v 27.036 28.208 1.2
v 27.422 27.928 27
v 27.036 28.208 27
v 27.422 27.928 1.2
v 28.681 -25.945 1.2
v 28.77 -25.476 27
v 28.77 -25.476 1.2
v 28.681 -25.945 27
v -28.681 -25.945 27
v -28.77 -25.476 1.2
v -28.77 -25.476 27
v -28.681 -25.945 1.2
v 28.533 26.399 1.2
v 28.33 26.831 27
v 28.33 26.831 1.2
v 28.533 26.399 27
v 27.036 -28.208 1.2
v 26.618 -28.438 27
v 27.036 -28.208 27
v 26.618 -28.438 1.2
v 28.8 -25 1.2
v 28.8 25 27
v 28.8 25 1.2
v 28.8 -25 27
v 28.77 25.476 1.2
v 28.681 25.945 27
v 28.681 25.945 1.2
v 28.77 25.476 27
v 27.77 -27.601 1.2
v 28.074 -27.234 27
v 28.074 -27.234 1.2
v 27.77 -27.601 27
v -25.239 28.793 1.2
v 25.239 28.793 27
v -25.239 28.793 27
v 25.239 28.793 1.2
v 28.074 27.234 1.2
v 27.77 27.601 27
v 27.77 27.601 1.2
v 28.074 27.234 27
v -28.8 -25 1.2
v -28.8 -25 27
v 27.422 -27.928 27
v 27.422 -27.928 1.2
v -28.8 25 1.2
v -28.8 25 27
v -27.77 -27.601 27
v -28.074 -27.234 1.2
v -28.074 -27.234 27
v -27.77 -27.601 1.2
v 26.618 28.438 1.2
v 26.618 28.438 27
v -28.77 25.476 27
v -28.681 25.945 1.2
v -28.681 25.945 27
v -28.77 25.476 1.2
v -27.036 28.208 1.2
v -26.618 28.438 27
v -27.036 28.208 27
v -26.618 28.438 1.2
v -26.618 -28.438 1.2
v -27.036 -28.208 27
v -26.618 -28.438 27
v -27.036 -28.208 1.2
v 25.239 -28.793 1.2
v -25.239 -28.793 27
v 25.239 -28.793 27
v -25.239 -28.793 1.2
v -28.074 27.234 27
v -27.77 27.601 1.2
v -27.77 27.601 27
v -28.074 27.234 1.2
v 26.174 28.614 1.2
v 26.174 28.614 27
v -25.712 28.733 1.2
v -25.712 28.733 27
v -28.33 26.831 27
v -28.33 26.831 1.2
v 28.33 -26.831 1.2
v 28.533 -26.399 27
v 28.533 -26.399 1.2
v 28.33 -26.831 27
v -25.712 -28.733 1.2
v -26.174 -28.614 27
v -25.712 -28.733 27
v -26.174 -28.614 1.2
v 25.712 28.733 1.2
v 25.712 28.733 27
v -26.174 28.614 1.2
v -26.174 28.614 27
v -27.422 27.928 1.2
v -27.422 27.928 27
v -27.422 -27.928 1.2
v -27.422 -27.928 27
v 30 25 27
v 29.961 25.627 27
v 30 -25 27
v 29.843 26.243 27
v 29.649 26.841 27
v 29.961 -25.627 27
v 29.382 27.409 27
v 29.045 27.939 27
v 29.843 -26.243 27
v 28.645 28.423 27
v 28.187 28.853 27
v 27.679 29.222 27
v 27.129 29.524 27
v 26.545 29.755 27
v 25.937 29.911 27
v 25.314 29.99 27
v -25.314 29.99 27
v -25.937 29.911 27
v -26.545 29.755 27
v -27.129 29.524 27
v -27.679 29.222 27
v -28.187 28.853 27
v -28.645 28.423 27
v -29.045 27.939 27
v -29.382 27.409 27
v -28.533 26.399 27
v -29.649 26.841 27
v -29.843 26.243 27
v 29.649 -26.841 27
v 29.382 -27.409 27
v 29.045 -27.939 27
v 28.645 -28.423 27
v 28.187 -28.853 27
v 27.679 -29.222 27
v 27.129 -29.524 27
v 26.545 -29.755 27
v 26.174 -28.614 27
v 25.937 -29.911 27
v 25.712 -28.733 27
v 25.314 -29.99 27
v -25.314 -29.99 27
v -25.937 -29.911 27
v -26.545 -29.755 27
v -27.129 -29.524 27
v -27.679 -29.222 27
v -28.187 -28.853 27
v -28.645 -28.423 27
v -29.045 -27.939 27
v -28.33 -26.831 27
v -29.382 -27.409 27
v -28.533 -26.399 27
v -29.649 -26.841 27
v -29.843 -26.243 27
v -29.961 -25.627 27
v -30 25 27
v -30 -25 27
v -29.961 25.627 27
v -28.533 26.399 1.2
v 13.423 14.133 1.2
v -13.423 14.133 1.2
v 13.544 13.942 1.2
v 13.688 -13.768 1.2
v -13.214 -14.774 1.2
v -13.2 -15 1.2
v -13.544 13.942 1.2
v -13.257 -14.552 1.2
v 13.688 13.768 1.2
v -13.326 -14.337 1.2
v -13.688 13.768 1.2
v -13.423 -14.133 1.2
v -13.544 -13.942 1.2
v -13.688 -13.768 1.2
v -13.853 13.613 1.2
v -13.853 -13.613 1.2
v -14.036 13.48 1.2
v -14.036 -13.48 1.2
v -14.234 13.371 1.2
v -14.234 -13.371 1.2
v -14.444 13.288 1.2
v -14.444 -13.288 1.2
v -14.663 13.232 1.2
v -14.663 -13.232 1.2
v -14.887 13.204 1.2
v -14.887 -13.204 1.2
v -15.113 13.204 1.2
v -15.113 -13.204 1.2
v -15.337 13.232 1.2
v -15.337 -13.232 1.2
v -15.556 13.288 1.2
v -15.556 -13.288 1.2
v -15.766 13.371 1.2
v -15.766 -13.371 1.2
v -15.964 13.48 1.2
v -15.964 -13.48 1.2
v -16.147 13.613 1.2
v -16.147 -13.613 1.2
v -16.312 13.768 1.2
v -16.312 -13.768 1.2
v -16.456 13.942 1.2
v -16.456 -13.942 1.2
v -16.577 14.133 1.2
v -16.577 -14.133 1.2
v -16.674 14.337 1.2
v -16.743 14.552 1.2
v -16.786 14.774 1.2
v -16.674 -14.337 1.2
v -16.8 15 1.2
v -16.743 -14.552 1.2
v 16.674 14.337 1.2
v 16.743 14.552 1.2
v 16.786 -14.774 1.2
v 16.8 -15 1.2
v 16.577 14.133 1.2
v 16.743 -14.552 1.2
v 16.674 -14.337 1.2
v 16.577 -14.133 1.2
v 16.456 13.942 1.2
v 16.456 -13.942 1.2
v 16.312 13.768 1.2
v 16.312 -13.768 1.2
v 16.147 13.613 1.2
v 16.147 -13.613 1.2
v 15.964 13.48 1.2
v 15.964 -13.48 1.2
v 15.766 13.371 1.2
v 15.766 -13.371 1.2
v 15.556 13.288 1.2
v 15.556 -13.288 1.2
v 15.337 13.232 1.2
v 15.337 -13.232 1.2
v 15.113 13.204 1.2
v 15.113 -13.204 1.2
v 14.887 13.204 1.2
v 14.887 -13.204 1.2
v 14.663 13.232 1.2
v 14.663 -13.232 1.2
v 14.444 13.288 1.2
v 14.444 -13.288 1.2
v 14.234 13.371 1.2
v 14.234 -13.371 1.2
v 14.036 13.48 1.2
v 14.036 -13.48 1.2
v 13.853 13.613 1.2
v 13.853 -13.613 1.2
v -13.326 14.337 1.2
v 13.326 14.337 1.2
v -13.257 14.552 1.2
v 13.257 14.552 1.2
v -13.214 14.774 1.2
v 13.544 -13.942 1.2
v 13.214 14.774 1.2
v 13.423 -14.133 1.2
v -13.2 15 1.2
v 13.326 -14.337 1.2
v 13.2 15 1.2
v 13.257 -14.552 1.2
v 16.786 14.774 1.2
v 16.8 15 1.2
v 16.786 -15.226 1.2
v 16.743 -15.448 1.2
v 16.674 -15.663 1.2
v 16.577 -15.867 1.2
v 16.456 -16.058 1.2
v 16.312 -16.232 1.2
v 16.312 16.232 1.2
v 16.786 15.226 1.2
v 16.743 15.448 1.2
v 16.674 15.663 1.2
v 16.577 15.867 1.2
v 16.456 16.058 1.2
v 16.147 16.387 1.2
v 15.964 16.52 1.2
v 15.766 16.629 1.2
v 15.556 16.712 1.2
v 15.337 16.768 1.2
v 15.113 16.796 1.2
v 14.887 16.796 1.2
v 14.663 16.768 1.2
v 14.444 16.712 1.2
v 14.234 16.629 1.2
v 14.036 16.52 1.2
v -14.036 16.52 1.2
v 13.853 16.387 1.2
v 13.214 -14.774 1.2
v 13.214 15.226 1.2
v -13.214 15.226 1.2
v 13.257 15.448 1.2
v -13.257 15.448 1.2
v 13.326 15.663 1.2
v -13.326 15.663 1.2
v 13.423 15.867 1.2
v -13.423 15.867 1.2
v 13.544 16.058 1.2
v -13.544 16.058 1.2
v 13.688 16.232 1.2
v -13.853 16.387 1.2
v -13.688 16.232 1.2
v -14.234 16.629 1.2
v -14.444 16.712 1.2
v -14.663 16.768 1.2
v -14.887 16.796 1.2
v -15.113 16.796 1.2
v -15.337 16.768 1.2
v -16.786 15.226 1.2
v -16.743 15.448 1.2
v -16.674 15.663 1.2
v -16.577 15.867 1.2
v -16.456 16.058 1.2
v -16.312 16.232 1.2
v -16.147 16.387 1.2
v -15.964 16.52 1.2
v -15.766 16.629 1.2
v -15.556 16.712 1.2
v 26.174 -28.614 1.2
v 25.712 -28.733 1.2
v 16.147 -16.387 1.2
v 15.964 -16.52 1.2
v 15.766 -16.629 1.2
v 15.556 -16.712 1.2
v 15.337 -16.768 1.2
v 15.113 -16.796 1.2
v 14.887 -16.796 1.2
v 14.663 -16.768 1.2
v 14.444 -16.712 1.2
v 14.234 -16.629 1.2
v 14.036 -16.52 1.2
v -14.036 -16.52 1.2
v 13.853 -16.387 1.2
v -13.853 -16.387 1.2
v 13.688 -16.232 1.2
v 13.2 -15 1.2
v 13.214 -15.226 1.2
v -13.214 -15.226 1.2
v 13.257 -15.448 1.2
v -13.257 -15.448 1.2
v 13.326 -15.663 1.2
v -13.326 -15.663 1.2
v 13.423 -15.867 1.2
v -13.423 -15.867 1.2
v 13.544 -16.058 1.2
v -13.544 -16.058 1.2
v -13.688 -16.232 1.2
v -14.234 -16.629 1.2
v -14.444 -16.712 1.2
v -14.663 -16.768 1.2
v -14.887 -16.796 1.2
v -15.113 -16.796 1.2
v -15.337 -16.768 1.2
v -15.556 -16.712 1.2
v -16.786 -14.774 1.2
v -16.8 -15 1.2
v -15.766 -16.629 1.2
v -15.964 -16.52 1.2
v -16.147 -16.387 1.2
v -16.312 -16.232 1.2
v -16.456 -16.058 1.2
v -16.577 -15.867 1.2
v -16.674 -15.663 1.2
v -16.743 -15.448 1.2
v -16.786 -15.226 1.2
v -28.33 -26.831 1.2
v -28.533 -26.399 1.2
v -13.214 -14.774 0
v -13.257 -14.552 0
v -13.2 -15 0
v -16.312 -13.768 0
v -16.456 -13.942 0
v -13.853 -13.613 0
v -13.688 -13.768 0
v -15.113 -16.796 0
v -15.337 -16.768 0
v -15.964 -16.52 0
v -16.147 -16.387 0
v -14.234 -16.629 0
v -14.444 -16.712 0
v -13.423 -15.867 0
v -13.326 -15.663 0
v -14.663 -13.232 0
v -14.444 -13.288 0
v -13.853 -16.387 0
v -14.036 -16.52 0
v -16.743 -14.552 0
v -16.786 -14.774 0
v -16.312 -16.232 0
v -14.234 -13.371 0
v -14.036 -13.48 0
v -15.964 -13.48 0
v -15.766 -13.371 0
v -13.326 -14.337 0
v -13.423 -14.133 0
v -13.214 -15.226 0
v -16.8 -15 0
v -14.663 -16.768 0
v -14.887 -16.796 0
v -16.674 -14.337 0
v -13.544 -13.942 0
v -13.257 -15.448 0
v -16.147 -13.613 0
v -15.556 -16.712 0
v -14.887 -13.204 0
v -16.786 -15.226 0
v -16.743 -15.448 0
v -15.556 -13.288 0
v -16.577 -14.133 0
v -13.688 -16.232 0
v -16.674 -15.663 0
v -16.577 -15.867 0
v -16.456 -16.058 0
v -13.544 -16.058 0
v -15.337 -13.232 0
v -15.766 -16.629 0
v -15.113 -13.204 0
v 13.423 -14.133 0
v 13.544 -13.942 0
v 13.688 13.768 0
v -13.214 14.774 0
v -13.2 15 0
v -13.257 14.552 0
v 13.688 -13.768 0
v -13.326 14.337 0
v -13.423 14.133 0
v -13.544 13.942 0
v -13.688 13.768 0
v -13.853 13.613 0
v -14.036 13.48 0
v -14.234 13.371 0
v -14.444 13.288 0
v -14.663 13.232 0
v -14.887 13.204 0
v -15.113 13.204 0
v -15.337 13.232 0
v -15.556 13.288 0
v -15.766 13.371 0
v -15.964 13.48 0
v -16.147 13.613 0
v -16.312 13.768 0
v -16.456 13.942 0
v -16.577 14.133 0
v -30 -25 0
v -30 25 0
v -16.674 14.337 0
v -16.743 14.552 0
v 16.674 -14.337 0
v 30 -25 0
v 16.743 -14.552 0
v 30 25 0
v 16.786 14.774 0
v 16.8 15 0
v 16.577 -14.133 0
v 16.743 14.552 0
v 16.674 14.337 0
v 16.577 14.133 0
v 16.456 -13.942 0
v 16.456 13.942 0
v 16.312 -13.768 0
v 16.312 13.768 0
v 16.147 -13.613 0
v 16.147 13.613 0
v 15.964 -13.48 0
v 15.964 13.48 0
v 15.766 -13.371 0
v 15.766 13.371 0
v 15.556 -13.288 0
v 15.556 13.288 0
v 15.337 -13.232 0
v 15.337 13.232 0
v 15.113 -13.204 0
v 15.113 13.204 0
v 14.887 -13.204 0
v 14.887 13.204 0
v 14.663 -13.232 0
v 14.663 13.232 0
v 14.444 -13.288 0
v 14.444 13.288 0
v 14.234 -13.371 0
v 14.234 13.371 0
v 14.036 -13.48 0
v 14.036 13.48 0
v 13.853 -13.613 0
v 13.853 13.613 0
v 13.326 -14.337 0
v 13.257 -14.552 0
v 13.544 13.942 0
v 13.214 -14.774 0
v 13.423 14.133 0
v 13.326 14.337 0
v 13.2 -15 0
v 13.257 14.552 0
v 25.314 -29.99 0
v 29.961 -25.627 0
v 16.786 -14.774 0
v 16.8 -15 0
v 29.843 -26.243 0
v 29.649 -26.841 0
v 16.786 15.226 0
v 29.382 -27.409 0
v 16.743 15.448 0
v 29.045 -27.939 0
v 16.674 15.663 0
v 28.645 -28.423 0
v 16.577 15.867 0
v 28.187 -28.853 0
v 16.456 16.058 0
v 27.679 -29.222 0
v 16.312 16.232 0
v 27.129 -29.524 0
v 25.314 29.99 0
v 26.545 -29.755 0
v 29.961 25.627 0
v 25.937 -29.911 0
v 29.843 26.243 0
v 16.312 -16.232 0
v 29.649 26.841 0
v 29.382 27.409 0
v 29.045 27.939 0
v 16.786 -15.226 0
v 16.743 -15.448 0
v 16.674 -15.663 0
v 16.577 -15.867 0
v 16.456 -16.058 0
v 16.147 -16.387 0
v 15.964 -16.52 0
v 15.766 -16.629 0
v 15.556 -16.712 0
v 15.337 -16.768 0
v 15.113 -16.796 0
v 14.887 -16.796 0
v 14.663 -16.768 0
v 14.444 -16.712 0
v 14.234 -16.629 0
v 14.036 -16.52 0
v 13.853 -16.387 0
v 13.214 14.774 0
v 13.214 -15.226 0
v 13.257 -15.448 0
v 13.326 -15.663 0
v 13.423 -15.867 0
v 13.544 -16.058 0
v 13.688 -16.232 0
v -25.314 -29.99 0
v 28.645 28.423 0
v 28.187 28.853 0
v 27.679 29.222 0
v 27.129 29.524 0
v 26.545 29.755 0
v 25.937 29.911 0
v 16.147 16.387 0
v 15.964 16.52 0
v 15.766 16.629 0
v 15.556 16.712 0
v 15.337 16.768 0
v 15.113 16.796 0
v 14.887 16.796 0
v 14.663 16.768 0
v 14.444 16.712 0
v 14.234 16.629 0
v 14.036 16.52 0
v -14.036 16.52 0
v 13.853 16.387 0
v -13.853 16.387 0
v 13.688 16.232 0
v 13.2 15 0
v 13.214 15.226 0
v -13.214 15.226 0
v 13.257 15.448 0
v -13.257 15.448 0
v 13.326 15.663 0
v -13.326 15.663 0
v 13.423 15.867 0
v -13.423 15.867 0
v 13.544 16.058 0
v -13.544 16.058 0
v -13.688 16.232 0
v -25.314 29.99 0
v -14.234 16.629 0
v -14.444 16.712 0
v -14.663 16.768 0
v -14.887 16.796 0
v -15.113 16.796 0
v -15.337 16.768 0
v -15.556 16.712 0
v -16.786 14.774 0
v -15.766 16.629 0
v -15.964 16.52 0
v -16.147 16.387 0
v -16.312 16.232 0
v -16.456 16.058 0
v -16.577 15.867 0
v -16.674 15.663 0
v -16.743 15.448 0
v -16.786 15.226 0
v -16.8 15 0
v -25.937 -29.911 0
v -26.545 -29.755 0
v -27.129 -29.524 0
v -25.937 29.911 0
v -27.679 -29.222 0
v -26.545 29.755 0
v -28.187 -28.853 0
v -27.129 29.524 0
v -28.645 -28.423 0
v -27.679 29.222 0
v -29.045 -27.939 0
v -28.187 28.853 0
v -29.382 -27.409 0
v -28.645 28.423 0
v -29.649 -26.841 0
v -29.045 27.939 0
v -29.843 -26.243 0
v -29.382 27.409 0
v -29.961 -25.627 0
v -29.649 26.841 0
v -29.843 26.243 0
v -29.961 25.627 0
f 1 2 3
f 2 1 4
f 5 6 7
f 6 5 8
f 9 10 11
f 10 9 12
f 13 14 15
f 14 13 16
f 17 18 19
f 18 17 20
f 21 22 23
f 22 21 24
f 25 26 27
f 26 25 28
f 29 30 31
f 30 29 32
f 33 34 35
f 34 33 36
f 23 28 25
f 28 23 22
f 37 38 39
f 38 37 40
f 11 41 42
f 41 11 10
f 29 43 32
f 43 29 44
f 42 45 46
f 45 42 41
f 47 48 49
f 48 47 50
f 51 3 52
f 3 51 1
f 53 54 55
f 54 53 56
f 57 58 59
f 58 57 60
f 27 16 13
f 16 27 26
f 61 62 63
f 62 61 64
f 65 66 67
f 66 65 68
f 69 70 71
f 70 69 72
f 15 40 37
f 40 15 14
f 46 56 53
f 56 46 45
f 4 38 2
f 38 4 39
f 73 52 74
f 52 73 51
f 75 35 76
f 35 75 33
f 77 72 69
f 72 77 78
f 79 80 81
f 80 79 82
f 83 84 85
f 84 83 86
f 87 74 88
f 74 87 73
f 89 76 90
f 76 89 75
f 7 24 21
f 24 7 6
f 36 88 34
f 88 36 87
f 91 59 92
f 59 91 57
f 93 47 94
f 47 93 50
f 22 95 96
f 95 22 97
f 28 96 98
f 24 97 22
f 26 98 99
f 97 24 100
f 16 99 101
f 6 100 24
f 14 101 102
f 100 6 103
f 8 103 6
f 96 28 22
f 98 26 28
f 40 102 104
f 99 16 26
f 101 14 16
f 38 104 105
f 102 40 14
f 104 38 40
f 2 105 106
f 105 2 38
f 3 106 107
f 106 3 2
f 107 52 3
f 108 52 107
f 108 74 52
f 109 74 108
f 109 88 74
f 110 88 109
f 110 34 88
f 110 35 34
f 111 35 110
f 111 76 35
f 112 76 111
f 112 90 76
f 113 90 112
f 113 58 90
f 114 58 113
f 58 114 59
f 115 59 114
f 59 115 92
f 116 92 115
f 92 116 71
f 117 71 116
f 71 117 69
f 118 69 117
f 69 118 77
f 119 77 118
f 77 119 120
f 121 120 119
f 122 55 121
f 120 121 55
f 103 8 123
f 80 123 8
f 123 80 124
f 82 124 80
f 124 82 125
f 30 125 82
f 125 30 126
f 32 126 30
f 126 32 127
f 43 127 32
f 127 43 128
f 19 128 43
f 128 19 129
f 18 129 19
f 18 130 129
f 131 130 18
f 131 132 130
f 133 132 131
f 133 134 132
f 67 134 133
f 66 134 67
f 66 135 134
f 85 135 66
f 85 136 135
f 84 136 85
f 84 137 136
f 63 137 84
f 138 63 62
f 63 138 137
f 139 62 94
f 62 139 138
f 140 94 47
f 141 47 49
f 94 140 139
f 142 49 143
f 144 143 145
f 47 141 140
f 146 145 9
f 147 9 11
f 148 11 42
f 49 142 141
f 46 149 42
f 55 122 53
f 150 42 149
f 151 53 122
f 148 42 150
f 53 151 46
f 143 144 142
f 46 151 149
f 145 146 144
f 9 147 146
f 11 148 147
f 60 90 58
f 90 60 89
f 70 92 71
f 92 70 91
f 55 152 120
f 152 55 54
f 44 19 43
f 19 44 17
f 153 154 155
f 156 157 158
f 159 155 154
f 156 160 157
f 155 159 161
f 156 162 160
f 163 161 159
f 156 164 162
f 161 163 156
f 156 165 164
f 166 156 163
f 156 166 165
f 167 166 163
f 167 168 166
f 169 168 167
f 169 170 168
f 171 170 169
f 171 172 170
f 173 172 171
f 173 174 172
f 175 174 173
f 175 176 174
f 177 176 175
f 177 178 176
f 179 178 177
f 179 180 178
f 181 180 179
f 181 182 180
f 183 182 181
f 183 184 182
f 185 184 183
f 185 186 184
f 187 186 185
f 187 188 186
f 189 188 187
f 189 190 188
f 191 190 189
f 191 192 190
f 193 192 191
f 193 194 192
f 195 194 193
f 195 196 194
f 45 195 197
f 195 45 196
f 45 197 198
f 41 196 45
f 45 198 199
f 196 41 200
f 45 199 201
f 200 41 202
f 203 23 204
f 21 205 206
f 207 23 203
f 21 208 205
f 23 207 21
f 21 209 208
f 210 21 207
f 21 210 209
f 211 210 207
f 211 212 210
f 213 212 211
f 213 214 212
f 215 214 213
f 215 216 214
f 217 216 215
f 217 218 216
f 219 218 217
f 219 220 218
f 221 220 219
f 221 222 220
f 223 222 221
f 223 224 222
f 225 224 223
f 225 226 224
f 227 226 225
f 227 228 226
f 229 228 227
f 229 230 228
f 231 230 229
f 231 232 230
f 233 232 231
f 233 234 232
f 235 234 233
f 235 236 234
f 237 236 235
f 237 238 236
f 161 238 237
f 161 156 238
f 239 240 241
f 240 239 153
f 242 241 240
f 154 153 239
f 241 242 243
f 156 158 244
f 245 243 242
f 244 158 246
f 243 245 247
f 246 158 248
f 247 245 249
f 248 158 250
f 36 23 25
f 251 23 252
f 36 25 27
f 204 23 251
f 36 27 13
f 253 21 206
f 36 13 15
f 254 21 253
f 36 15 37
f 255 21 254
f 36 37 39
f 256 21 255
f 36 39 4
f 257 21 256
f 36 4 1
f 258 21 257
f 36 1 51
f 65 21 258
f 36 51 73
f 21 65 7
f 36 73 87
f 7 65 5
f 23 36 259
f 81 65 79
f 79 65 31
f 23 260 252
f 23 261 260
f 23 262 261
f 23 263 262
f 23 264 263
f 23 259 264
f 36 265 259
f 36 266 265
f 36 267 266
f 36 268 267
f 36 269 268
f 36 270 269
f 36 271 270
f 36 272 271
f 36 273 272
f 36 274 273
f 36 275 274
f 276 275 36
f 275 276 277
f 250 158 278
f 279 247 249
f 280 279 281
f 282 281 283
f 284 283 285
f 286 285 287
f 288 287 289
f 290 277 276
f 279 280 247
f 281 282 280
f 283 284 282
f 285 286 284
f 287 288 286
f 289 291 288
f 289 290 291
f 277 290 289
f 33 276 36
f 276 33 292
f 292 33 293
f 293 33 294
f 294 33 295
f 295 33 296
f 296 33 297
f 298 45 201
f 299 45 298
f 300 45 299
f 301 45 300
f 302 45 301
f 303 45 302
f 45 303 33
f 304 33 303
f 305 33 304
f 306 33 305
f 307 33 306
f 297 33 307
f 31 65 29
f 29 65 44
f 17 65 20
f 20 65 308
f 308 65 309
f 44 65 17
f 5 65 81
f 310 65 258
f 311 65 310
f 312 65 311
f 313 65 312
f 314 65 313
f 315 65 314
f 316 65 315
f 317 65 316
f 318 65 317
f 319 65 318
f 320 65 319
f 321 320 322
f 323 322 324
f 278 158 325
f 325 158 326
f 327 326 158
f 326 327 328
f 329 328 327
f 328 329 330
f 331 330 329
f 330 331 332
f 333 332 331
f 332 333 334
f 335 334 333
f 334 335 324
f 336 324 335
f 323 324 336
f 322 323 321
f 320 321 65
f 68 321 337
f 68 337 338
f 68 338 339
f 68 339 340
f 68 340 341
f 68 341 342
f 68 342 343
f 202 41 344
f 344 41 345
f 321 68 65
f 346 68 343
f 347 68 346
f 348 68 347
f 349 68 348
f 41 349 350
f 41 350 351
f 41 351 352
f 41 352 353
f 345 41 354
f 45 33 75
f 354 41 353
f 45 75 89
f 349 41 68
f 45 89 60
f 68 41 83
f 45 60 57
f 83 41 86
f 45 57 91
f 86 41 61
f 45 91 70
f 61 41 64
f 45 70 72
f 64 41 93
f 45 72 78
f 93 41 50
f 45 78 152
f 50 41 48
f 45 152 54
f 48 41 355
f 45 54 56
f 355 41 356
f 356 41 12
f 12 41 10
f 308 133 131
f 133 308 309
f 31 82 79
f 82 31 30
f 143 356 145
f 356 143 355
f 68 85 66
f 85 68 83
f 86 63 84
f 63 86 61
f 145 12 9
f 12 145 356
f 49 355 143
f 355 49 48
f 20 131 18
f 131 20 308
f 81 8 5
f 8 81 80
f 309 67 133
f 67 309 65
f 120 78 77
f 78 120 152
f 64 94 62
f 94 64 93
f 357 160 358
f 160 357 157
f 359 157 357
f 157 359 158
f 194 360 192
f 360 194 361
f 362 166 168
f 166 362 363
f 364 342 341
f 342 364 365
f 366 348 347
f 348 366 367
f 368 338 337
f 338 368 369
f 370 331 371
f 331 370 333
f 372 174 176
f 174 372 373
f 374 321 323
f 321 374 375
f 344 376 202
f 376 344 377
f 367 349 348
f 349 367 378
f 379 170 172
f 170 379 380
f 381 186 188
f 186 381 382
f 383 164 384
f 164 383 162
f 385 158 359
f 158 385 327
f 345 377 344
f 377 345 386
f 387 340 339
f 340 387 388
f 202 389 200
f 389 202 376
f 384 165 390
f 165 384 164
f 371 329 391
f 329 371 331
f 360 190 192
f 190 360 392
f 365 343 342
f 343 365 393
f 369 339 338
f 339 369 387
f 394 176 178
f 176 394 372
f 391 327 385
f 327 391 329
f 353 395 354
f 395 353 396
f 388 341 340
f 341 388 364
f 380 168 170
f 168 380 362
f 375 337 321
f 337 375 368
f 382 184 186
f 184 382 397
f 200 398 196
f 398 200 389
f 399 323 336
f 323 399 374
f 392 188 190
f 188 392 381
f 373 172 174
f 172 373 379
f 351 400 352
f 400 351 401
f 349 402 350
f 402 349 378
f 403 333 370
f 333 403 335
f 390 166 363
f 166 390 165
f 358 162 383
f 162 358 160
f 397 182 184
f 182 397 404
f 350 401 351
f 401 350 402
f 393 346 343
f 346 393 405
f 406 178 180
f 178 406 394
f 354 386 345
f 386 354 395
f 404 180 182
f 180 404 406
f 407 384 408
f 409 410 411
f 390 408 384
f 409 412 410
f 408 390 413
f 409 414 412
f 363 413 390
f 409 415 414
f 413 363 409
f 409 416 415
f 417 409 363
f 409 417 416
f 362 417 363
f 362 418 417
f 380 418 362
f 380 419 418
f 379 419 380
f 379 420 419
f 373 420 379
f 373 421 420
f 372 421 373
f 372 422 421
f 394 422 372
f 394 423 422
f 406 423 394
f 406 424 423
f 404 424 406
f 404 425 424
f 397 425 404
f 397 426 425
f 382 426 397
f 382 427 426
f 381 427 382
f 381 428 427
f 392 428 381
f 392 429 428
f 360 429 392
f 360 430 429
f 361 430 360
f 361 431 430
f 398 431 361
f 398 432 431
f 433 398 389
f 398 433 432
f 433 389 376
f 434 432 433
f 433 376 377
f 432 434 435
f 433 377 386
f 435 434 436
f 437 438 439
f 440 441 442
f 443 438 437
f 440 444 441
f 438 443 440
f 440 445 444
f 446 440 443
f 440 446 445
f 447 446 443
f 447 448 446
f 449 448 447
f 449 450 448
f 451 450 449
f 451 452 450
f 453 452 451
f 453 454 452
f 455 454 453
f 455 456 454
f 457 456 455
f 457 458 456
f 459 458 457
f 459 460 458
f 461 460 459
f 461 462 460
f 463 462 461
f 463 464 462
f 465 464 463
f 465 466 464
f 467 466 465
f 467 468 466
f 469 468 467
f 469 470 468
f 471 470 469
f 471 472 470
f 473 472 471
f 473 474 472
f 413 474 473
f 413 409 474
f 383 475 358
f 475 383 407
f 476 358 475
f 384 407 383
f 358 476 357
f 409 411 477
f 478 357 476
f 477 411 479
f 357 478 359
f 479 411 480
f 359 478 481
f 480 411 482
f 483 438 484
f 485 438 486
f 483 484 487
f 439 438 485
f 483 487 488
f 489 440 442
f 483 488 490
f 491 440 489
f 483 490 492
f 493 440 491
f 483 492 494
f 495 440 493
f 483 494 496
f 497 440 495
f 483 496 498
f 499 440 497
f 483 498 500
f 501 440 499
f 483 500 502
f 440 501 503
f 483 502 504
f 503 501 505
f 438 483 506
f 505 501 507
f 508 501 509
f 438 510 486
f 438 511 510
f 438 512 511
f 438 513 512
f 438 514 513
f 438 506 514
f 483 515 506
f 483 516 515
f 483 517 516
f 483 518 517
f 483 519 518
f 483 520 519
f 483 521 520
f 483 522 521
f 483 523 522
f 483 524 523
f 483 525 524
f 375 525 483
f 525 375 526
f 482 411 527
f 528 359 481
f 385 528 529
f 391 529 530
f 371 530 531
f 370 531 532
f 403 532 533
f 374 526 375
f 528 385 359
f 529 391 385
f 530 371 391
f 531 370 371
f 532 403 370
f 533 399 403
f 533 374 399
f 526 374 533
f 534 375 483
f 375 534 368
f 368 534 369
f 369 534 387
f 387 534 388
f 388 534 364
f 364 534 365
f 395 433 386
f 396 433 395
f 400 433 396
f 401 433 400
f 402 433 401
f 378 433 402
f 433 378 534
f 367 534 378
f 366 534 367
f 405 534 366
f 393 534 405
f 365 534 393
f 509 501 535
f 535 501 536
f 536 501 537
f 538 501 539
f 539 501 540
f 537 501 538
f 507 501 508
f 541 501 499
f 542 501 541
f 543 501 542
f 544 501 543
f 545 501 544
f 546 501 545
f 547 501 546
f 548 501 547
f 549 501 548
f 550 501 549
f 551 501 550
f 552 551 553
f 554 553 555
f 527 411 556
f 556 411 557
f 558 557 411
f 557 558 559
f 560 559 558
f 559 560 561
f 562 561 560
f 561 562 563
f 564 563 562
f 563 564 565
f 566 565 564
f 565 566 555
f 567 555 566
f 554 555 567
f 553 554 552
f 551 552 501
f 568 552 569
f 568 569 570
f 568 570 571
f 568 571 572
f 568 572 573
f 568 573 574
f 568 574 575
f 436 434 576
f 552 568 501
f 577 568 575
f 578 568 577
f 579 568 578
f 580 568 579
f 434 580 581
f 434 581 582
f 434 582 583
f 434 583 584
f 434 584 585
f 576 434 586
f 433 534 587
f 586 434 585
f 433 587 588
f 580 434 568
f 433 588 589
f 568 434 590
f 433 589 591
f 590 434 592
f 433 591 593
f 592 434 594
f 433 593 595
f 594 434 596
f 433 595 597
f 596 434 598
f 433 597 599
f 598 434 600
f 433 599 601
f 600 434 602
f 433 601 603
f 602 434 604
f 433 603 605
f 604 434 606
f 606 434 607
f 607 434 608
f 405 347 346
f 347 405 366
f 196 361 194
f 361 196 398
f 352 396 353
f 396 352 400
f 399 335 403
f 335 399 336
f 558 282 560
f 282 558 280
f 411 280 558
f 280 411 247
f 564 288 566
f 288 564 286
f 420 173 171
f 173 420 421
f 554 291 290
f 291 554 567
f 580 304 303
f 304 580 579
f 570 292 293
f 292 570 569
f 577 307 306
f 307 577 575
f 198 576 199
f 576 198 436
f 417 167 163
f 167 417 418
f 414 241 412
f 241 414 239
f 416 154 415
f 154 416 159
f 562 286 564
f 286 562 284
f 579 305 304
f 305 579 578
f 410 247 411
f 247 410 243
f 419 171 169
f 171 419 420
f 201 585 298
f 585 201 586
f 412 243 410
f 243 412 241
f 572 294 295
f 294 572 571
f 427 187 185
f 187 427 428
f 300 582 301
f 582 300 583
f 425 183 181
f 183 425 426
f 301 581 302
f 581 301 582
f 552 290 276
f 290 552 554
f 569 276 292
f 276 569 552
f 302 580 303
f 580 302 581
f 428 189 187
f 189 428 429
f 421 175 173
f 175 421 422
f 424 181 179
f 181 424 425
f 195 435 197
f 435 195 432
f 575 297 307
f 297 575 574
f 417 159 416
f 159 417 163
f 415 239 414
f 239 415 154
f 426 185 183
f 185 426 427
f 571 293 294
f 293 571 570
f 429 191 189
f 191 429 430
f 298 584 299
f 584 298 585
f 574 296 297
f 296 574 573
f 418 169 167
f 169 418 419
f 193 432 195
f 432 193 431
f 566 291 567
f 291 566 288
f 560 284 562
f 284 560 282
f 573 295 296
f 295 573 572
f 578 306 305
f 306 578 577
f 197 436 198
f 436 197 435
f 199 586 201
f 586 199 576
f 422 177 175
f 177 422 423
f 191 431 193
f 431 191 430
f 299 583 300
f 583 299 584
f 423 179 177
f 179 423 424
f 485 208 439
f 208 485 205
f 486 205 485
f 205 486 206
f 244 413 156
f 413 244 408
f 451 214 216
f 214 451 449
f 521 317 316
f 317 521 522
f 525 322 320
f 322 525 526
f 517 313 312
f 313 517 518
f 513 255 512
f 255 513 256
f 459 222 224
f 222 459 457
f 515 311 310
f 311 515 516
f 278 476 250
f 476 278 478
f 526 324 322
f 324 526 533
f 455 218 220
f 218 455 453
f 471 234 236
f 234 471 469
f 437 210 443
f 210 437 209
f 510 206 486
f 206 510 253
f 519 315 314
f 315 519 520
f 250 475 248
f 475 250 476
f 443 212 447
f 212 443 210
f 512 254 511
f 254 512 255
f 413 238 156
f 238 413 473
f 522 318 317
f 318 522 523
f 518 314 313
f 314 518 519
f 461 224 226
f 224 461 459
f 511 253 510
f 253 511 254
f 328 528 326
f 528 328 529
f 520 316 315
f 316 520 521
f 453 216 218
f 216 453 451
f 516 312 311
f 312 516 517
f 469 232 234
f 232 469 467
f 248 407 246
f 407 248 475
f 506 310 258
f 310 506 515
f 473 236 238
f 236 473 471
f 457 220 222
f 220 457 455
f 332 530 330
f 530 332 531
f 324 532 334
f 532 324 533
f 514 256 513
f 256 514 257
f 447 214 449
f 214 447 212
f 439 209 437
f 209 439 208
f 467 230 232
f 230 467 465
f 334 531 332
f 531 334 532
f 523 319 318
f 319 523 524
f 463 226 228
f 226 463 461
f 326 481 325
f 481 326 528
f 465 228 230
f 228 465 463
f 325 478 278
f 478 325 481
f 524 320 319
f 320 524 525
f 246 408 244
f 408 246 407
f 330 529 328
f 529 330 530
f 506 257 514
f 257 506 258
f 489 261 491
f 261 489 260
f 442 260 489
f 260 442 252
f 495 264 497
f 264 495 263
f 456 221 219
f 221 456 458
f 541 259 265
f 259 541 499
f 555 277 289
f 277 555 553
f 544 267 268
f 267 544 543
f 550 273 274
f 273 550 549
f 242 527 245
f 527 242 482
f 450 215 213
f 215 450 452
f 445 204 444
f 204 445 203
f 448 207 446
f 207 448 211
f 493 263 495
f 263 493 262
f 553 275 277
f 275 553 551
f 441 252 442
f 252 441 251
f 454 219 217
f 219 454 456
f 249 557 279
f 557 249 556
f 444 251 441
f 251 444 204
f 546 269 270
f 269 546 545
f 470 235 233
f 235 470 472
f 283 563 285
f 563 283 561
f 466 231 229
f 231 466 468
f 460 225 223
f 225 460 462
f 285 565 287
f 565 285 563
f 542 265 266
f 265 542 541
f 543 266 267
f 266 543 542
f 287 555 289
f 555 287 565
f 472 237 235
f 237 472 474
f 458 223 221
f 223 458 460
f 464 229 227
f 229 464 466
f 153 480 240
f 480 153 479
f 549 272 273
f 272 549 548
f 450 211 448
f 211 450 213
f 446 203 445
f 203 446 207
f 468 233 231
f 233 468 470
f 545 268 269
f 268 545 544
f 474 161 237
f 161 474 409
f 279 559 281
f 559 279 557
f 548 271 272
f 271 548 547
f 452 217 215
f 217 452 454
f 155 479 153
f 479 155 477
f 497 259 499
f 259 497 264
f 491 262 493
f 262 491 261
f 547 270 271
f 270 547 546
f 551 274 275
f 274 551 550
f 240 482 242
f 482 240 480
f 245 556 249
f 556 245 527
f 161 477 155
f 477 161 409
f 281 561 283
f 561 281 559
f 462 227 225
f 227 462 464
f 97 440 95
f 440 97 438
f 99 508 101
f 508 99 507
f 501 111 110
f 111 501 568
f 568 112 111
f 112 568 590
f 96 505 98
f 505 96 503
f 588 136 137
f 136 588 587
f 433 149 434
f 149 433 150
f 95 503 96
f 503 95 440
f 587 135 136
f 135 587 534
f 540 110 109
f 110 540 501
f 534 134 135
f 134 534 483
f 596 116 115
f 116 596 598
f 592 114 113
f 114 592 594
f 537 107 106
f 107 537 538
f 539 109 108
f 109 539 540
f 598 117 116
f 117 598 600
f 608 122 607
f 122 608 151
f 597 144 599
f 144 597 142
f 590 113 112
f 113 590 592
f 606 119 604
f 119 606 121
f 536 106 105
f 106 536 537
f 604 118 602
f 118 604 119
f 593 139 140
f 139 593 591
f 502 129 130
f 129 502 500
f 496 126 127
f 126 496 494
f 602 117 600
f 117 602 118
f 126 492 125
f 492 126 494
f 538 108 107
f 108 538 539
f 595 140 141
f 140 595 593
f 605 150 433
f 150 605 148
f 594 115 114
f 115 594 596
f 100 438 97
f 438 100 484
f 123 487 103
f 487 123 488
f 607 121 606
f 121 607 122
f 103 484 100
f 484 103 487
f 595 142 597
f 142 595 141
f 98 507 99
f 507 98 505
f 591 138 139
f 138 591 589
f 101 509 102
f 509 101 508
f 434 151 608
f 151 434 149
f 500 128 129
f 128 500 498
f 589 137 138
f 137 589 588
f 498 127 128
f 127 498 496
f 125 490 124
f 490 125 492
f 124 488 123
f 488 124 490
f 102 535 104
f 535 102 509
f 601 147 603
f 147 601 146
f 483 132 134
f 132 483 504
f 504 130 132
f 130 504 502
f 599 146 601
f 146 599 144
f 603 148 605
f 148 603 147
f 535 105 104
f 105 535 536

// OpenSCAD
$fn = 50;


difference() {
	union() {
		hull() {
			translate(v = [-25.0000000000, 25.0000000000, 0]) {
				cylinder(h = 27, r = 5);
			}
			translate(v = [25.0000000000, 25.0000000000, 0]) {
				cylinder(h = 27, r = 5);
			}
			translate(v = [-25.0000000000, -25.0000000000, 0]) {
				cylinder(h = 27, r = 5);
			}
			translate(v = [25.0000000000, -25.0000000000, 0]) {
				cylinder(h = 27, r = 5);
			}
		}
	}
	union() {
		translate(v = [0, 0, 1.2000000000]) {
			hull() {
				translate(v = [-25.0000000000, 25.0000000000, 0]) {
					cylinder(h = 25.8000000000, r = 3.8000000000);
				}
				translate(v = [25.0000000000, 25.0000000000, 0]) {
					cylinder(h = 25.8000000000, r = 3.8000000000);
				}
				translate(v = [-25.0000000000, -25.0000000000, 0]) {
					cylinder(h = 25.8000000000, r = 3.8000000000);
				}
				translate(v = [25.0000000000, -25.0000000000, 0]) {
					cylinder(h = 25.8000000000, r = 3.8000000000);
				}
			}
		}
		#translate(v = [-15.0000000000, -15.0000000000, 0]) {
			cylinder(h = 1.2000000000, r = 1.8000000000);
		}
		#translate(v = [-15.0000000000, 15.0000000000, 0]) {
			cylinder(h = 1.2000000000, r = 1.8000000000);
		}
		#translate(v = [15.0000000000, -15.0000000000, 0]) {
			cylinder(h = 1.2000000000, r = 1.8000000000);
		}
		#translate(v = [15.0000000000, 15.0000000000, 0]) {
			cylinder(h = 1.2000000000, r = 1.8000000000);
		}
	}
}
